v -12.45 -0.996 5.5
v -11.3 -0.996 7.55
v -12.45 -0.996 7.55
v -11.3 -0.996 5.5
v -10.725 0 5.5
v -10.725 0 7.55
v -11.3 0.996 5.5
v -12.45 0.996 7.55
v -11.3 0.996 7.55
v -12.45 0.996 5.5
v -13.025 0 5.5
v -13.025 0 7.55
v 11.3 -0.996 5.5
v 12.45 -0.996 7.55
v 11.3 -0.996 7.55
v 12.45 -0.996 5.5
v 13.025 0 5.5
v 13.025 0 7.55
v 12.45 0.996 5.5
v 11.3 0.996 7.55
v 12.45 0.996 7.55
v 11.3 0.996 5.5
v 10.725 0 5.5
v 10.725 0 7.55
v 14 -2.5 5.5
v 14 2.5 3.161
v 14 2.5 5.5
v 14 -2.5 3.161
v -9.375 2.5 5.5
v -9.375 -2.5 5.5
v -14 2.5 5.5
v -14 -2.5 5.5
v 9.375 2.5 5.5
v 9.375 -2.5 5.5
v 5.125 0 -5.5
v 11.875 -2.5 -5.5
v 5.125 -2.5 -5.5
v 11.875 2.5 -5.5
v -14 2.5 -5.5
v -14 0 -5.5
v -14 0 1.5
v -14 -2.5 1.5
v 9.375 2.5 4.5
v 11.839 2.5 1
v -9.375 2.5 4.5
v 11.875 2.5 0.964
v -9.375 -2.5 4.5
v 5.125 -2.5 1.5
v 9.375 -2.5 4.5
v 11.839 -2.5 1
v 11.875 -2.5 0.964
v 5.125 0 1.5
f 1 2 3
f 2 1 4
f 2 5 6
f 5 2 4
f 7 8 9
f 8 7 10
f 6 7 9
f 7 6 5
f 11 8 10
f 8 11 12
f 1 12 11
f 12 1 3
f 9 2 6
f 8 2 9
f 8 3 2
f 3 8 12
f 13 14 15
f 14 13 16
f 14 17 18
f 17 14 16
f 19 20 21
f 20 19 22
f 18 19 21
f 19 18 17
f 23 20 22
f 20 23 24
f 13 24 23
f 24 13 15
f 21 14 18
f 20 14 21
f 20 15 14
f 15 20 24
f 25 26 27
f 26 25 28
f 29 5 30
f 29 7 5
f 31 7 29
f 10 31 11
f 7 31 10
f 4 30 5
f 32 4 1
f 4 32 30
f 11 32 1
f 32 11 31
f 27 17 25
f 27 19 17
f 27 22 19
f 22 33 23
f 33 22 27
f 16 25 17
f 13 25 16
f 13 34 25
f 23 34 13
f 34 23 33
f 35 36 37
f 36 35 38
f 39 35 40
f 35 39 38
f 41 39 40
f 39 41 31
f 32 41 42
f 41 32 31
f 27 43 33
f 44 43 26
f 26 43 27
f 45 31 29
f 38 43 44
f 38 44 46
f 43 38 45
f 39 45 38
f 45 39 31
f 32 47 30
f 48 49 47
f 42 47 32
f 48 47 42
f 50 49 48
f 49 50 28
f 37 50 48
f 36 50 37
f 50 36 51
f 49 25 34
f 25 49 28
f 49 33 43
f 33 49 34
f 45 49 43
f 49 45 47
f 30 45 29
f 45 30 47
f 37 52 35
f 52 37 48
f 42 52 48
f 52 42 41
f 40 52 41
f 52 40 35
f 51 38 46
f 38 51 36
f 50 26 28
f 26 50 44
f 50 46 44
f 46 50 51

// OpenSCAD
body=[28,5,11];
hole_d=2.3;
hole_h=2.0;
hole_dist=23.75;

hdmi_width=20;
hdmi_height=14;
audio_width=5;
audio_height=13;

difference()
{
  union()
  {
    cube(body,center=true);
    // screw pins
    for(i=[-1:2:1])
      translate([hole_dist/2*i,0,body[2]/2+hole_h/2])
      cylinder(d=hole_d,h=hole_h+0.1,$fn=6,center=true);
  }
  // cut clearing for ribbon cable
  translate([0,0,body[2]/2])
    cube([hole_dist-5,10,2],center=true);
  // cut bottom stand
  // dip switch 
  // hdmi
  translate([-hole_dist/2+hdmi_width/2-3,-5,-body[2]/2])
    cube([hdmi_width,10,hdmi_height],center=true);
  // audio jack
  translate([hole_dist/2+audio_width/2,0,-body[2]/2])
    cube([audio_width,10,audio_height],center=true);
  // 45 deg transtion
  translate([hole_dist/2+audio_width/2+1,0,-body[2]/2+audio_height-audio_width-1.5])
    rotate([0,45,0])
      cube([audio_width,10,audio_width],center=true);
}
